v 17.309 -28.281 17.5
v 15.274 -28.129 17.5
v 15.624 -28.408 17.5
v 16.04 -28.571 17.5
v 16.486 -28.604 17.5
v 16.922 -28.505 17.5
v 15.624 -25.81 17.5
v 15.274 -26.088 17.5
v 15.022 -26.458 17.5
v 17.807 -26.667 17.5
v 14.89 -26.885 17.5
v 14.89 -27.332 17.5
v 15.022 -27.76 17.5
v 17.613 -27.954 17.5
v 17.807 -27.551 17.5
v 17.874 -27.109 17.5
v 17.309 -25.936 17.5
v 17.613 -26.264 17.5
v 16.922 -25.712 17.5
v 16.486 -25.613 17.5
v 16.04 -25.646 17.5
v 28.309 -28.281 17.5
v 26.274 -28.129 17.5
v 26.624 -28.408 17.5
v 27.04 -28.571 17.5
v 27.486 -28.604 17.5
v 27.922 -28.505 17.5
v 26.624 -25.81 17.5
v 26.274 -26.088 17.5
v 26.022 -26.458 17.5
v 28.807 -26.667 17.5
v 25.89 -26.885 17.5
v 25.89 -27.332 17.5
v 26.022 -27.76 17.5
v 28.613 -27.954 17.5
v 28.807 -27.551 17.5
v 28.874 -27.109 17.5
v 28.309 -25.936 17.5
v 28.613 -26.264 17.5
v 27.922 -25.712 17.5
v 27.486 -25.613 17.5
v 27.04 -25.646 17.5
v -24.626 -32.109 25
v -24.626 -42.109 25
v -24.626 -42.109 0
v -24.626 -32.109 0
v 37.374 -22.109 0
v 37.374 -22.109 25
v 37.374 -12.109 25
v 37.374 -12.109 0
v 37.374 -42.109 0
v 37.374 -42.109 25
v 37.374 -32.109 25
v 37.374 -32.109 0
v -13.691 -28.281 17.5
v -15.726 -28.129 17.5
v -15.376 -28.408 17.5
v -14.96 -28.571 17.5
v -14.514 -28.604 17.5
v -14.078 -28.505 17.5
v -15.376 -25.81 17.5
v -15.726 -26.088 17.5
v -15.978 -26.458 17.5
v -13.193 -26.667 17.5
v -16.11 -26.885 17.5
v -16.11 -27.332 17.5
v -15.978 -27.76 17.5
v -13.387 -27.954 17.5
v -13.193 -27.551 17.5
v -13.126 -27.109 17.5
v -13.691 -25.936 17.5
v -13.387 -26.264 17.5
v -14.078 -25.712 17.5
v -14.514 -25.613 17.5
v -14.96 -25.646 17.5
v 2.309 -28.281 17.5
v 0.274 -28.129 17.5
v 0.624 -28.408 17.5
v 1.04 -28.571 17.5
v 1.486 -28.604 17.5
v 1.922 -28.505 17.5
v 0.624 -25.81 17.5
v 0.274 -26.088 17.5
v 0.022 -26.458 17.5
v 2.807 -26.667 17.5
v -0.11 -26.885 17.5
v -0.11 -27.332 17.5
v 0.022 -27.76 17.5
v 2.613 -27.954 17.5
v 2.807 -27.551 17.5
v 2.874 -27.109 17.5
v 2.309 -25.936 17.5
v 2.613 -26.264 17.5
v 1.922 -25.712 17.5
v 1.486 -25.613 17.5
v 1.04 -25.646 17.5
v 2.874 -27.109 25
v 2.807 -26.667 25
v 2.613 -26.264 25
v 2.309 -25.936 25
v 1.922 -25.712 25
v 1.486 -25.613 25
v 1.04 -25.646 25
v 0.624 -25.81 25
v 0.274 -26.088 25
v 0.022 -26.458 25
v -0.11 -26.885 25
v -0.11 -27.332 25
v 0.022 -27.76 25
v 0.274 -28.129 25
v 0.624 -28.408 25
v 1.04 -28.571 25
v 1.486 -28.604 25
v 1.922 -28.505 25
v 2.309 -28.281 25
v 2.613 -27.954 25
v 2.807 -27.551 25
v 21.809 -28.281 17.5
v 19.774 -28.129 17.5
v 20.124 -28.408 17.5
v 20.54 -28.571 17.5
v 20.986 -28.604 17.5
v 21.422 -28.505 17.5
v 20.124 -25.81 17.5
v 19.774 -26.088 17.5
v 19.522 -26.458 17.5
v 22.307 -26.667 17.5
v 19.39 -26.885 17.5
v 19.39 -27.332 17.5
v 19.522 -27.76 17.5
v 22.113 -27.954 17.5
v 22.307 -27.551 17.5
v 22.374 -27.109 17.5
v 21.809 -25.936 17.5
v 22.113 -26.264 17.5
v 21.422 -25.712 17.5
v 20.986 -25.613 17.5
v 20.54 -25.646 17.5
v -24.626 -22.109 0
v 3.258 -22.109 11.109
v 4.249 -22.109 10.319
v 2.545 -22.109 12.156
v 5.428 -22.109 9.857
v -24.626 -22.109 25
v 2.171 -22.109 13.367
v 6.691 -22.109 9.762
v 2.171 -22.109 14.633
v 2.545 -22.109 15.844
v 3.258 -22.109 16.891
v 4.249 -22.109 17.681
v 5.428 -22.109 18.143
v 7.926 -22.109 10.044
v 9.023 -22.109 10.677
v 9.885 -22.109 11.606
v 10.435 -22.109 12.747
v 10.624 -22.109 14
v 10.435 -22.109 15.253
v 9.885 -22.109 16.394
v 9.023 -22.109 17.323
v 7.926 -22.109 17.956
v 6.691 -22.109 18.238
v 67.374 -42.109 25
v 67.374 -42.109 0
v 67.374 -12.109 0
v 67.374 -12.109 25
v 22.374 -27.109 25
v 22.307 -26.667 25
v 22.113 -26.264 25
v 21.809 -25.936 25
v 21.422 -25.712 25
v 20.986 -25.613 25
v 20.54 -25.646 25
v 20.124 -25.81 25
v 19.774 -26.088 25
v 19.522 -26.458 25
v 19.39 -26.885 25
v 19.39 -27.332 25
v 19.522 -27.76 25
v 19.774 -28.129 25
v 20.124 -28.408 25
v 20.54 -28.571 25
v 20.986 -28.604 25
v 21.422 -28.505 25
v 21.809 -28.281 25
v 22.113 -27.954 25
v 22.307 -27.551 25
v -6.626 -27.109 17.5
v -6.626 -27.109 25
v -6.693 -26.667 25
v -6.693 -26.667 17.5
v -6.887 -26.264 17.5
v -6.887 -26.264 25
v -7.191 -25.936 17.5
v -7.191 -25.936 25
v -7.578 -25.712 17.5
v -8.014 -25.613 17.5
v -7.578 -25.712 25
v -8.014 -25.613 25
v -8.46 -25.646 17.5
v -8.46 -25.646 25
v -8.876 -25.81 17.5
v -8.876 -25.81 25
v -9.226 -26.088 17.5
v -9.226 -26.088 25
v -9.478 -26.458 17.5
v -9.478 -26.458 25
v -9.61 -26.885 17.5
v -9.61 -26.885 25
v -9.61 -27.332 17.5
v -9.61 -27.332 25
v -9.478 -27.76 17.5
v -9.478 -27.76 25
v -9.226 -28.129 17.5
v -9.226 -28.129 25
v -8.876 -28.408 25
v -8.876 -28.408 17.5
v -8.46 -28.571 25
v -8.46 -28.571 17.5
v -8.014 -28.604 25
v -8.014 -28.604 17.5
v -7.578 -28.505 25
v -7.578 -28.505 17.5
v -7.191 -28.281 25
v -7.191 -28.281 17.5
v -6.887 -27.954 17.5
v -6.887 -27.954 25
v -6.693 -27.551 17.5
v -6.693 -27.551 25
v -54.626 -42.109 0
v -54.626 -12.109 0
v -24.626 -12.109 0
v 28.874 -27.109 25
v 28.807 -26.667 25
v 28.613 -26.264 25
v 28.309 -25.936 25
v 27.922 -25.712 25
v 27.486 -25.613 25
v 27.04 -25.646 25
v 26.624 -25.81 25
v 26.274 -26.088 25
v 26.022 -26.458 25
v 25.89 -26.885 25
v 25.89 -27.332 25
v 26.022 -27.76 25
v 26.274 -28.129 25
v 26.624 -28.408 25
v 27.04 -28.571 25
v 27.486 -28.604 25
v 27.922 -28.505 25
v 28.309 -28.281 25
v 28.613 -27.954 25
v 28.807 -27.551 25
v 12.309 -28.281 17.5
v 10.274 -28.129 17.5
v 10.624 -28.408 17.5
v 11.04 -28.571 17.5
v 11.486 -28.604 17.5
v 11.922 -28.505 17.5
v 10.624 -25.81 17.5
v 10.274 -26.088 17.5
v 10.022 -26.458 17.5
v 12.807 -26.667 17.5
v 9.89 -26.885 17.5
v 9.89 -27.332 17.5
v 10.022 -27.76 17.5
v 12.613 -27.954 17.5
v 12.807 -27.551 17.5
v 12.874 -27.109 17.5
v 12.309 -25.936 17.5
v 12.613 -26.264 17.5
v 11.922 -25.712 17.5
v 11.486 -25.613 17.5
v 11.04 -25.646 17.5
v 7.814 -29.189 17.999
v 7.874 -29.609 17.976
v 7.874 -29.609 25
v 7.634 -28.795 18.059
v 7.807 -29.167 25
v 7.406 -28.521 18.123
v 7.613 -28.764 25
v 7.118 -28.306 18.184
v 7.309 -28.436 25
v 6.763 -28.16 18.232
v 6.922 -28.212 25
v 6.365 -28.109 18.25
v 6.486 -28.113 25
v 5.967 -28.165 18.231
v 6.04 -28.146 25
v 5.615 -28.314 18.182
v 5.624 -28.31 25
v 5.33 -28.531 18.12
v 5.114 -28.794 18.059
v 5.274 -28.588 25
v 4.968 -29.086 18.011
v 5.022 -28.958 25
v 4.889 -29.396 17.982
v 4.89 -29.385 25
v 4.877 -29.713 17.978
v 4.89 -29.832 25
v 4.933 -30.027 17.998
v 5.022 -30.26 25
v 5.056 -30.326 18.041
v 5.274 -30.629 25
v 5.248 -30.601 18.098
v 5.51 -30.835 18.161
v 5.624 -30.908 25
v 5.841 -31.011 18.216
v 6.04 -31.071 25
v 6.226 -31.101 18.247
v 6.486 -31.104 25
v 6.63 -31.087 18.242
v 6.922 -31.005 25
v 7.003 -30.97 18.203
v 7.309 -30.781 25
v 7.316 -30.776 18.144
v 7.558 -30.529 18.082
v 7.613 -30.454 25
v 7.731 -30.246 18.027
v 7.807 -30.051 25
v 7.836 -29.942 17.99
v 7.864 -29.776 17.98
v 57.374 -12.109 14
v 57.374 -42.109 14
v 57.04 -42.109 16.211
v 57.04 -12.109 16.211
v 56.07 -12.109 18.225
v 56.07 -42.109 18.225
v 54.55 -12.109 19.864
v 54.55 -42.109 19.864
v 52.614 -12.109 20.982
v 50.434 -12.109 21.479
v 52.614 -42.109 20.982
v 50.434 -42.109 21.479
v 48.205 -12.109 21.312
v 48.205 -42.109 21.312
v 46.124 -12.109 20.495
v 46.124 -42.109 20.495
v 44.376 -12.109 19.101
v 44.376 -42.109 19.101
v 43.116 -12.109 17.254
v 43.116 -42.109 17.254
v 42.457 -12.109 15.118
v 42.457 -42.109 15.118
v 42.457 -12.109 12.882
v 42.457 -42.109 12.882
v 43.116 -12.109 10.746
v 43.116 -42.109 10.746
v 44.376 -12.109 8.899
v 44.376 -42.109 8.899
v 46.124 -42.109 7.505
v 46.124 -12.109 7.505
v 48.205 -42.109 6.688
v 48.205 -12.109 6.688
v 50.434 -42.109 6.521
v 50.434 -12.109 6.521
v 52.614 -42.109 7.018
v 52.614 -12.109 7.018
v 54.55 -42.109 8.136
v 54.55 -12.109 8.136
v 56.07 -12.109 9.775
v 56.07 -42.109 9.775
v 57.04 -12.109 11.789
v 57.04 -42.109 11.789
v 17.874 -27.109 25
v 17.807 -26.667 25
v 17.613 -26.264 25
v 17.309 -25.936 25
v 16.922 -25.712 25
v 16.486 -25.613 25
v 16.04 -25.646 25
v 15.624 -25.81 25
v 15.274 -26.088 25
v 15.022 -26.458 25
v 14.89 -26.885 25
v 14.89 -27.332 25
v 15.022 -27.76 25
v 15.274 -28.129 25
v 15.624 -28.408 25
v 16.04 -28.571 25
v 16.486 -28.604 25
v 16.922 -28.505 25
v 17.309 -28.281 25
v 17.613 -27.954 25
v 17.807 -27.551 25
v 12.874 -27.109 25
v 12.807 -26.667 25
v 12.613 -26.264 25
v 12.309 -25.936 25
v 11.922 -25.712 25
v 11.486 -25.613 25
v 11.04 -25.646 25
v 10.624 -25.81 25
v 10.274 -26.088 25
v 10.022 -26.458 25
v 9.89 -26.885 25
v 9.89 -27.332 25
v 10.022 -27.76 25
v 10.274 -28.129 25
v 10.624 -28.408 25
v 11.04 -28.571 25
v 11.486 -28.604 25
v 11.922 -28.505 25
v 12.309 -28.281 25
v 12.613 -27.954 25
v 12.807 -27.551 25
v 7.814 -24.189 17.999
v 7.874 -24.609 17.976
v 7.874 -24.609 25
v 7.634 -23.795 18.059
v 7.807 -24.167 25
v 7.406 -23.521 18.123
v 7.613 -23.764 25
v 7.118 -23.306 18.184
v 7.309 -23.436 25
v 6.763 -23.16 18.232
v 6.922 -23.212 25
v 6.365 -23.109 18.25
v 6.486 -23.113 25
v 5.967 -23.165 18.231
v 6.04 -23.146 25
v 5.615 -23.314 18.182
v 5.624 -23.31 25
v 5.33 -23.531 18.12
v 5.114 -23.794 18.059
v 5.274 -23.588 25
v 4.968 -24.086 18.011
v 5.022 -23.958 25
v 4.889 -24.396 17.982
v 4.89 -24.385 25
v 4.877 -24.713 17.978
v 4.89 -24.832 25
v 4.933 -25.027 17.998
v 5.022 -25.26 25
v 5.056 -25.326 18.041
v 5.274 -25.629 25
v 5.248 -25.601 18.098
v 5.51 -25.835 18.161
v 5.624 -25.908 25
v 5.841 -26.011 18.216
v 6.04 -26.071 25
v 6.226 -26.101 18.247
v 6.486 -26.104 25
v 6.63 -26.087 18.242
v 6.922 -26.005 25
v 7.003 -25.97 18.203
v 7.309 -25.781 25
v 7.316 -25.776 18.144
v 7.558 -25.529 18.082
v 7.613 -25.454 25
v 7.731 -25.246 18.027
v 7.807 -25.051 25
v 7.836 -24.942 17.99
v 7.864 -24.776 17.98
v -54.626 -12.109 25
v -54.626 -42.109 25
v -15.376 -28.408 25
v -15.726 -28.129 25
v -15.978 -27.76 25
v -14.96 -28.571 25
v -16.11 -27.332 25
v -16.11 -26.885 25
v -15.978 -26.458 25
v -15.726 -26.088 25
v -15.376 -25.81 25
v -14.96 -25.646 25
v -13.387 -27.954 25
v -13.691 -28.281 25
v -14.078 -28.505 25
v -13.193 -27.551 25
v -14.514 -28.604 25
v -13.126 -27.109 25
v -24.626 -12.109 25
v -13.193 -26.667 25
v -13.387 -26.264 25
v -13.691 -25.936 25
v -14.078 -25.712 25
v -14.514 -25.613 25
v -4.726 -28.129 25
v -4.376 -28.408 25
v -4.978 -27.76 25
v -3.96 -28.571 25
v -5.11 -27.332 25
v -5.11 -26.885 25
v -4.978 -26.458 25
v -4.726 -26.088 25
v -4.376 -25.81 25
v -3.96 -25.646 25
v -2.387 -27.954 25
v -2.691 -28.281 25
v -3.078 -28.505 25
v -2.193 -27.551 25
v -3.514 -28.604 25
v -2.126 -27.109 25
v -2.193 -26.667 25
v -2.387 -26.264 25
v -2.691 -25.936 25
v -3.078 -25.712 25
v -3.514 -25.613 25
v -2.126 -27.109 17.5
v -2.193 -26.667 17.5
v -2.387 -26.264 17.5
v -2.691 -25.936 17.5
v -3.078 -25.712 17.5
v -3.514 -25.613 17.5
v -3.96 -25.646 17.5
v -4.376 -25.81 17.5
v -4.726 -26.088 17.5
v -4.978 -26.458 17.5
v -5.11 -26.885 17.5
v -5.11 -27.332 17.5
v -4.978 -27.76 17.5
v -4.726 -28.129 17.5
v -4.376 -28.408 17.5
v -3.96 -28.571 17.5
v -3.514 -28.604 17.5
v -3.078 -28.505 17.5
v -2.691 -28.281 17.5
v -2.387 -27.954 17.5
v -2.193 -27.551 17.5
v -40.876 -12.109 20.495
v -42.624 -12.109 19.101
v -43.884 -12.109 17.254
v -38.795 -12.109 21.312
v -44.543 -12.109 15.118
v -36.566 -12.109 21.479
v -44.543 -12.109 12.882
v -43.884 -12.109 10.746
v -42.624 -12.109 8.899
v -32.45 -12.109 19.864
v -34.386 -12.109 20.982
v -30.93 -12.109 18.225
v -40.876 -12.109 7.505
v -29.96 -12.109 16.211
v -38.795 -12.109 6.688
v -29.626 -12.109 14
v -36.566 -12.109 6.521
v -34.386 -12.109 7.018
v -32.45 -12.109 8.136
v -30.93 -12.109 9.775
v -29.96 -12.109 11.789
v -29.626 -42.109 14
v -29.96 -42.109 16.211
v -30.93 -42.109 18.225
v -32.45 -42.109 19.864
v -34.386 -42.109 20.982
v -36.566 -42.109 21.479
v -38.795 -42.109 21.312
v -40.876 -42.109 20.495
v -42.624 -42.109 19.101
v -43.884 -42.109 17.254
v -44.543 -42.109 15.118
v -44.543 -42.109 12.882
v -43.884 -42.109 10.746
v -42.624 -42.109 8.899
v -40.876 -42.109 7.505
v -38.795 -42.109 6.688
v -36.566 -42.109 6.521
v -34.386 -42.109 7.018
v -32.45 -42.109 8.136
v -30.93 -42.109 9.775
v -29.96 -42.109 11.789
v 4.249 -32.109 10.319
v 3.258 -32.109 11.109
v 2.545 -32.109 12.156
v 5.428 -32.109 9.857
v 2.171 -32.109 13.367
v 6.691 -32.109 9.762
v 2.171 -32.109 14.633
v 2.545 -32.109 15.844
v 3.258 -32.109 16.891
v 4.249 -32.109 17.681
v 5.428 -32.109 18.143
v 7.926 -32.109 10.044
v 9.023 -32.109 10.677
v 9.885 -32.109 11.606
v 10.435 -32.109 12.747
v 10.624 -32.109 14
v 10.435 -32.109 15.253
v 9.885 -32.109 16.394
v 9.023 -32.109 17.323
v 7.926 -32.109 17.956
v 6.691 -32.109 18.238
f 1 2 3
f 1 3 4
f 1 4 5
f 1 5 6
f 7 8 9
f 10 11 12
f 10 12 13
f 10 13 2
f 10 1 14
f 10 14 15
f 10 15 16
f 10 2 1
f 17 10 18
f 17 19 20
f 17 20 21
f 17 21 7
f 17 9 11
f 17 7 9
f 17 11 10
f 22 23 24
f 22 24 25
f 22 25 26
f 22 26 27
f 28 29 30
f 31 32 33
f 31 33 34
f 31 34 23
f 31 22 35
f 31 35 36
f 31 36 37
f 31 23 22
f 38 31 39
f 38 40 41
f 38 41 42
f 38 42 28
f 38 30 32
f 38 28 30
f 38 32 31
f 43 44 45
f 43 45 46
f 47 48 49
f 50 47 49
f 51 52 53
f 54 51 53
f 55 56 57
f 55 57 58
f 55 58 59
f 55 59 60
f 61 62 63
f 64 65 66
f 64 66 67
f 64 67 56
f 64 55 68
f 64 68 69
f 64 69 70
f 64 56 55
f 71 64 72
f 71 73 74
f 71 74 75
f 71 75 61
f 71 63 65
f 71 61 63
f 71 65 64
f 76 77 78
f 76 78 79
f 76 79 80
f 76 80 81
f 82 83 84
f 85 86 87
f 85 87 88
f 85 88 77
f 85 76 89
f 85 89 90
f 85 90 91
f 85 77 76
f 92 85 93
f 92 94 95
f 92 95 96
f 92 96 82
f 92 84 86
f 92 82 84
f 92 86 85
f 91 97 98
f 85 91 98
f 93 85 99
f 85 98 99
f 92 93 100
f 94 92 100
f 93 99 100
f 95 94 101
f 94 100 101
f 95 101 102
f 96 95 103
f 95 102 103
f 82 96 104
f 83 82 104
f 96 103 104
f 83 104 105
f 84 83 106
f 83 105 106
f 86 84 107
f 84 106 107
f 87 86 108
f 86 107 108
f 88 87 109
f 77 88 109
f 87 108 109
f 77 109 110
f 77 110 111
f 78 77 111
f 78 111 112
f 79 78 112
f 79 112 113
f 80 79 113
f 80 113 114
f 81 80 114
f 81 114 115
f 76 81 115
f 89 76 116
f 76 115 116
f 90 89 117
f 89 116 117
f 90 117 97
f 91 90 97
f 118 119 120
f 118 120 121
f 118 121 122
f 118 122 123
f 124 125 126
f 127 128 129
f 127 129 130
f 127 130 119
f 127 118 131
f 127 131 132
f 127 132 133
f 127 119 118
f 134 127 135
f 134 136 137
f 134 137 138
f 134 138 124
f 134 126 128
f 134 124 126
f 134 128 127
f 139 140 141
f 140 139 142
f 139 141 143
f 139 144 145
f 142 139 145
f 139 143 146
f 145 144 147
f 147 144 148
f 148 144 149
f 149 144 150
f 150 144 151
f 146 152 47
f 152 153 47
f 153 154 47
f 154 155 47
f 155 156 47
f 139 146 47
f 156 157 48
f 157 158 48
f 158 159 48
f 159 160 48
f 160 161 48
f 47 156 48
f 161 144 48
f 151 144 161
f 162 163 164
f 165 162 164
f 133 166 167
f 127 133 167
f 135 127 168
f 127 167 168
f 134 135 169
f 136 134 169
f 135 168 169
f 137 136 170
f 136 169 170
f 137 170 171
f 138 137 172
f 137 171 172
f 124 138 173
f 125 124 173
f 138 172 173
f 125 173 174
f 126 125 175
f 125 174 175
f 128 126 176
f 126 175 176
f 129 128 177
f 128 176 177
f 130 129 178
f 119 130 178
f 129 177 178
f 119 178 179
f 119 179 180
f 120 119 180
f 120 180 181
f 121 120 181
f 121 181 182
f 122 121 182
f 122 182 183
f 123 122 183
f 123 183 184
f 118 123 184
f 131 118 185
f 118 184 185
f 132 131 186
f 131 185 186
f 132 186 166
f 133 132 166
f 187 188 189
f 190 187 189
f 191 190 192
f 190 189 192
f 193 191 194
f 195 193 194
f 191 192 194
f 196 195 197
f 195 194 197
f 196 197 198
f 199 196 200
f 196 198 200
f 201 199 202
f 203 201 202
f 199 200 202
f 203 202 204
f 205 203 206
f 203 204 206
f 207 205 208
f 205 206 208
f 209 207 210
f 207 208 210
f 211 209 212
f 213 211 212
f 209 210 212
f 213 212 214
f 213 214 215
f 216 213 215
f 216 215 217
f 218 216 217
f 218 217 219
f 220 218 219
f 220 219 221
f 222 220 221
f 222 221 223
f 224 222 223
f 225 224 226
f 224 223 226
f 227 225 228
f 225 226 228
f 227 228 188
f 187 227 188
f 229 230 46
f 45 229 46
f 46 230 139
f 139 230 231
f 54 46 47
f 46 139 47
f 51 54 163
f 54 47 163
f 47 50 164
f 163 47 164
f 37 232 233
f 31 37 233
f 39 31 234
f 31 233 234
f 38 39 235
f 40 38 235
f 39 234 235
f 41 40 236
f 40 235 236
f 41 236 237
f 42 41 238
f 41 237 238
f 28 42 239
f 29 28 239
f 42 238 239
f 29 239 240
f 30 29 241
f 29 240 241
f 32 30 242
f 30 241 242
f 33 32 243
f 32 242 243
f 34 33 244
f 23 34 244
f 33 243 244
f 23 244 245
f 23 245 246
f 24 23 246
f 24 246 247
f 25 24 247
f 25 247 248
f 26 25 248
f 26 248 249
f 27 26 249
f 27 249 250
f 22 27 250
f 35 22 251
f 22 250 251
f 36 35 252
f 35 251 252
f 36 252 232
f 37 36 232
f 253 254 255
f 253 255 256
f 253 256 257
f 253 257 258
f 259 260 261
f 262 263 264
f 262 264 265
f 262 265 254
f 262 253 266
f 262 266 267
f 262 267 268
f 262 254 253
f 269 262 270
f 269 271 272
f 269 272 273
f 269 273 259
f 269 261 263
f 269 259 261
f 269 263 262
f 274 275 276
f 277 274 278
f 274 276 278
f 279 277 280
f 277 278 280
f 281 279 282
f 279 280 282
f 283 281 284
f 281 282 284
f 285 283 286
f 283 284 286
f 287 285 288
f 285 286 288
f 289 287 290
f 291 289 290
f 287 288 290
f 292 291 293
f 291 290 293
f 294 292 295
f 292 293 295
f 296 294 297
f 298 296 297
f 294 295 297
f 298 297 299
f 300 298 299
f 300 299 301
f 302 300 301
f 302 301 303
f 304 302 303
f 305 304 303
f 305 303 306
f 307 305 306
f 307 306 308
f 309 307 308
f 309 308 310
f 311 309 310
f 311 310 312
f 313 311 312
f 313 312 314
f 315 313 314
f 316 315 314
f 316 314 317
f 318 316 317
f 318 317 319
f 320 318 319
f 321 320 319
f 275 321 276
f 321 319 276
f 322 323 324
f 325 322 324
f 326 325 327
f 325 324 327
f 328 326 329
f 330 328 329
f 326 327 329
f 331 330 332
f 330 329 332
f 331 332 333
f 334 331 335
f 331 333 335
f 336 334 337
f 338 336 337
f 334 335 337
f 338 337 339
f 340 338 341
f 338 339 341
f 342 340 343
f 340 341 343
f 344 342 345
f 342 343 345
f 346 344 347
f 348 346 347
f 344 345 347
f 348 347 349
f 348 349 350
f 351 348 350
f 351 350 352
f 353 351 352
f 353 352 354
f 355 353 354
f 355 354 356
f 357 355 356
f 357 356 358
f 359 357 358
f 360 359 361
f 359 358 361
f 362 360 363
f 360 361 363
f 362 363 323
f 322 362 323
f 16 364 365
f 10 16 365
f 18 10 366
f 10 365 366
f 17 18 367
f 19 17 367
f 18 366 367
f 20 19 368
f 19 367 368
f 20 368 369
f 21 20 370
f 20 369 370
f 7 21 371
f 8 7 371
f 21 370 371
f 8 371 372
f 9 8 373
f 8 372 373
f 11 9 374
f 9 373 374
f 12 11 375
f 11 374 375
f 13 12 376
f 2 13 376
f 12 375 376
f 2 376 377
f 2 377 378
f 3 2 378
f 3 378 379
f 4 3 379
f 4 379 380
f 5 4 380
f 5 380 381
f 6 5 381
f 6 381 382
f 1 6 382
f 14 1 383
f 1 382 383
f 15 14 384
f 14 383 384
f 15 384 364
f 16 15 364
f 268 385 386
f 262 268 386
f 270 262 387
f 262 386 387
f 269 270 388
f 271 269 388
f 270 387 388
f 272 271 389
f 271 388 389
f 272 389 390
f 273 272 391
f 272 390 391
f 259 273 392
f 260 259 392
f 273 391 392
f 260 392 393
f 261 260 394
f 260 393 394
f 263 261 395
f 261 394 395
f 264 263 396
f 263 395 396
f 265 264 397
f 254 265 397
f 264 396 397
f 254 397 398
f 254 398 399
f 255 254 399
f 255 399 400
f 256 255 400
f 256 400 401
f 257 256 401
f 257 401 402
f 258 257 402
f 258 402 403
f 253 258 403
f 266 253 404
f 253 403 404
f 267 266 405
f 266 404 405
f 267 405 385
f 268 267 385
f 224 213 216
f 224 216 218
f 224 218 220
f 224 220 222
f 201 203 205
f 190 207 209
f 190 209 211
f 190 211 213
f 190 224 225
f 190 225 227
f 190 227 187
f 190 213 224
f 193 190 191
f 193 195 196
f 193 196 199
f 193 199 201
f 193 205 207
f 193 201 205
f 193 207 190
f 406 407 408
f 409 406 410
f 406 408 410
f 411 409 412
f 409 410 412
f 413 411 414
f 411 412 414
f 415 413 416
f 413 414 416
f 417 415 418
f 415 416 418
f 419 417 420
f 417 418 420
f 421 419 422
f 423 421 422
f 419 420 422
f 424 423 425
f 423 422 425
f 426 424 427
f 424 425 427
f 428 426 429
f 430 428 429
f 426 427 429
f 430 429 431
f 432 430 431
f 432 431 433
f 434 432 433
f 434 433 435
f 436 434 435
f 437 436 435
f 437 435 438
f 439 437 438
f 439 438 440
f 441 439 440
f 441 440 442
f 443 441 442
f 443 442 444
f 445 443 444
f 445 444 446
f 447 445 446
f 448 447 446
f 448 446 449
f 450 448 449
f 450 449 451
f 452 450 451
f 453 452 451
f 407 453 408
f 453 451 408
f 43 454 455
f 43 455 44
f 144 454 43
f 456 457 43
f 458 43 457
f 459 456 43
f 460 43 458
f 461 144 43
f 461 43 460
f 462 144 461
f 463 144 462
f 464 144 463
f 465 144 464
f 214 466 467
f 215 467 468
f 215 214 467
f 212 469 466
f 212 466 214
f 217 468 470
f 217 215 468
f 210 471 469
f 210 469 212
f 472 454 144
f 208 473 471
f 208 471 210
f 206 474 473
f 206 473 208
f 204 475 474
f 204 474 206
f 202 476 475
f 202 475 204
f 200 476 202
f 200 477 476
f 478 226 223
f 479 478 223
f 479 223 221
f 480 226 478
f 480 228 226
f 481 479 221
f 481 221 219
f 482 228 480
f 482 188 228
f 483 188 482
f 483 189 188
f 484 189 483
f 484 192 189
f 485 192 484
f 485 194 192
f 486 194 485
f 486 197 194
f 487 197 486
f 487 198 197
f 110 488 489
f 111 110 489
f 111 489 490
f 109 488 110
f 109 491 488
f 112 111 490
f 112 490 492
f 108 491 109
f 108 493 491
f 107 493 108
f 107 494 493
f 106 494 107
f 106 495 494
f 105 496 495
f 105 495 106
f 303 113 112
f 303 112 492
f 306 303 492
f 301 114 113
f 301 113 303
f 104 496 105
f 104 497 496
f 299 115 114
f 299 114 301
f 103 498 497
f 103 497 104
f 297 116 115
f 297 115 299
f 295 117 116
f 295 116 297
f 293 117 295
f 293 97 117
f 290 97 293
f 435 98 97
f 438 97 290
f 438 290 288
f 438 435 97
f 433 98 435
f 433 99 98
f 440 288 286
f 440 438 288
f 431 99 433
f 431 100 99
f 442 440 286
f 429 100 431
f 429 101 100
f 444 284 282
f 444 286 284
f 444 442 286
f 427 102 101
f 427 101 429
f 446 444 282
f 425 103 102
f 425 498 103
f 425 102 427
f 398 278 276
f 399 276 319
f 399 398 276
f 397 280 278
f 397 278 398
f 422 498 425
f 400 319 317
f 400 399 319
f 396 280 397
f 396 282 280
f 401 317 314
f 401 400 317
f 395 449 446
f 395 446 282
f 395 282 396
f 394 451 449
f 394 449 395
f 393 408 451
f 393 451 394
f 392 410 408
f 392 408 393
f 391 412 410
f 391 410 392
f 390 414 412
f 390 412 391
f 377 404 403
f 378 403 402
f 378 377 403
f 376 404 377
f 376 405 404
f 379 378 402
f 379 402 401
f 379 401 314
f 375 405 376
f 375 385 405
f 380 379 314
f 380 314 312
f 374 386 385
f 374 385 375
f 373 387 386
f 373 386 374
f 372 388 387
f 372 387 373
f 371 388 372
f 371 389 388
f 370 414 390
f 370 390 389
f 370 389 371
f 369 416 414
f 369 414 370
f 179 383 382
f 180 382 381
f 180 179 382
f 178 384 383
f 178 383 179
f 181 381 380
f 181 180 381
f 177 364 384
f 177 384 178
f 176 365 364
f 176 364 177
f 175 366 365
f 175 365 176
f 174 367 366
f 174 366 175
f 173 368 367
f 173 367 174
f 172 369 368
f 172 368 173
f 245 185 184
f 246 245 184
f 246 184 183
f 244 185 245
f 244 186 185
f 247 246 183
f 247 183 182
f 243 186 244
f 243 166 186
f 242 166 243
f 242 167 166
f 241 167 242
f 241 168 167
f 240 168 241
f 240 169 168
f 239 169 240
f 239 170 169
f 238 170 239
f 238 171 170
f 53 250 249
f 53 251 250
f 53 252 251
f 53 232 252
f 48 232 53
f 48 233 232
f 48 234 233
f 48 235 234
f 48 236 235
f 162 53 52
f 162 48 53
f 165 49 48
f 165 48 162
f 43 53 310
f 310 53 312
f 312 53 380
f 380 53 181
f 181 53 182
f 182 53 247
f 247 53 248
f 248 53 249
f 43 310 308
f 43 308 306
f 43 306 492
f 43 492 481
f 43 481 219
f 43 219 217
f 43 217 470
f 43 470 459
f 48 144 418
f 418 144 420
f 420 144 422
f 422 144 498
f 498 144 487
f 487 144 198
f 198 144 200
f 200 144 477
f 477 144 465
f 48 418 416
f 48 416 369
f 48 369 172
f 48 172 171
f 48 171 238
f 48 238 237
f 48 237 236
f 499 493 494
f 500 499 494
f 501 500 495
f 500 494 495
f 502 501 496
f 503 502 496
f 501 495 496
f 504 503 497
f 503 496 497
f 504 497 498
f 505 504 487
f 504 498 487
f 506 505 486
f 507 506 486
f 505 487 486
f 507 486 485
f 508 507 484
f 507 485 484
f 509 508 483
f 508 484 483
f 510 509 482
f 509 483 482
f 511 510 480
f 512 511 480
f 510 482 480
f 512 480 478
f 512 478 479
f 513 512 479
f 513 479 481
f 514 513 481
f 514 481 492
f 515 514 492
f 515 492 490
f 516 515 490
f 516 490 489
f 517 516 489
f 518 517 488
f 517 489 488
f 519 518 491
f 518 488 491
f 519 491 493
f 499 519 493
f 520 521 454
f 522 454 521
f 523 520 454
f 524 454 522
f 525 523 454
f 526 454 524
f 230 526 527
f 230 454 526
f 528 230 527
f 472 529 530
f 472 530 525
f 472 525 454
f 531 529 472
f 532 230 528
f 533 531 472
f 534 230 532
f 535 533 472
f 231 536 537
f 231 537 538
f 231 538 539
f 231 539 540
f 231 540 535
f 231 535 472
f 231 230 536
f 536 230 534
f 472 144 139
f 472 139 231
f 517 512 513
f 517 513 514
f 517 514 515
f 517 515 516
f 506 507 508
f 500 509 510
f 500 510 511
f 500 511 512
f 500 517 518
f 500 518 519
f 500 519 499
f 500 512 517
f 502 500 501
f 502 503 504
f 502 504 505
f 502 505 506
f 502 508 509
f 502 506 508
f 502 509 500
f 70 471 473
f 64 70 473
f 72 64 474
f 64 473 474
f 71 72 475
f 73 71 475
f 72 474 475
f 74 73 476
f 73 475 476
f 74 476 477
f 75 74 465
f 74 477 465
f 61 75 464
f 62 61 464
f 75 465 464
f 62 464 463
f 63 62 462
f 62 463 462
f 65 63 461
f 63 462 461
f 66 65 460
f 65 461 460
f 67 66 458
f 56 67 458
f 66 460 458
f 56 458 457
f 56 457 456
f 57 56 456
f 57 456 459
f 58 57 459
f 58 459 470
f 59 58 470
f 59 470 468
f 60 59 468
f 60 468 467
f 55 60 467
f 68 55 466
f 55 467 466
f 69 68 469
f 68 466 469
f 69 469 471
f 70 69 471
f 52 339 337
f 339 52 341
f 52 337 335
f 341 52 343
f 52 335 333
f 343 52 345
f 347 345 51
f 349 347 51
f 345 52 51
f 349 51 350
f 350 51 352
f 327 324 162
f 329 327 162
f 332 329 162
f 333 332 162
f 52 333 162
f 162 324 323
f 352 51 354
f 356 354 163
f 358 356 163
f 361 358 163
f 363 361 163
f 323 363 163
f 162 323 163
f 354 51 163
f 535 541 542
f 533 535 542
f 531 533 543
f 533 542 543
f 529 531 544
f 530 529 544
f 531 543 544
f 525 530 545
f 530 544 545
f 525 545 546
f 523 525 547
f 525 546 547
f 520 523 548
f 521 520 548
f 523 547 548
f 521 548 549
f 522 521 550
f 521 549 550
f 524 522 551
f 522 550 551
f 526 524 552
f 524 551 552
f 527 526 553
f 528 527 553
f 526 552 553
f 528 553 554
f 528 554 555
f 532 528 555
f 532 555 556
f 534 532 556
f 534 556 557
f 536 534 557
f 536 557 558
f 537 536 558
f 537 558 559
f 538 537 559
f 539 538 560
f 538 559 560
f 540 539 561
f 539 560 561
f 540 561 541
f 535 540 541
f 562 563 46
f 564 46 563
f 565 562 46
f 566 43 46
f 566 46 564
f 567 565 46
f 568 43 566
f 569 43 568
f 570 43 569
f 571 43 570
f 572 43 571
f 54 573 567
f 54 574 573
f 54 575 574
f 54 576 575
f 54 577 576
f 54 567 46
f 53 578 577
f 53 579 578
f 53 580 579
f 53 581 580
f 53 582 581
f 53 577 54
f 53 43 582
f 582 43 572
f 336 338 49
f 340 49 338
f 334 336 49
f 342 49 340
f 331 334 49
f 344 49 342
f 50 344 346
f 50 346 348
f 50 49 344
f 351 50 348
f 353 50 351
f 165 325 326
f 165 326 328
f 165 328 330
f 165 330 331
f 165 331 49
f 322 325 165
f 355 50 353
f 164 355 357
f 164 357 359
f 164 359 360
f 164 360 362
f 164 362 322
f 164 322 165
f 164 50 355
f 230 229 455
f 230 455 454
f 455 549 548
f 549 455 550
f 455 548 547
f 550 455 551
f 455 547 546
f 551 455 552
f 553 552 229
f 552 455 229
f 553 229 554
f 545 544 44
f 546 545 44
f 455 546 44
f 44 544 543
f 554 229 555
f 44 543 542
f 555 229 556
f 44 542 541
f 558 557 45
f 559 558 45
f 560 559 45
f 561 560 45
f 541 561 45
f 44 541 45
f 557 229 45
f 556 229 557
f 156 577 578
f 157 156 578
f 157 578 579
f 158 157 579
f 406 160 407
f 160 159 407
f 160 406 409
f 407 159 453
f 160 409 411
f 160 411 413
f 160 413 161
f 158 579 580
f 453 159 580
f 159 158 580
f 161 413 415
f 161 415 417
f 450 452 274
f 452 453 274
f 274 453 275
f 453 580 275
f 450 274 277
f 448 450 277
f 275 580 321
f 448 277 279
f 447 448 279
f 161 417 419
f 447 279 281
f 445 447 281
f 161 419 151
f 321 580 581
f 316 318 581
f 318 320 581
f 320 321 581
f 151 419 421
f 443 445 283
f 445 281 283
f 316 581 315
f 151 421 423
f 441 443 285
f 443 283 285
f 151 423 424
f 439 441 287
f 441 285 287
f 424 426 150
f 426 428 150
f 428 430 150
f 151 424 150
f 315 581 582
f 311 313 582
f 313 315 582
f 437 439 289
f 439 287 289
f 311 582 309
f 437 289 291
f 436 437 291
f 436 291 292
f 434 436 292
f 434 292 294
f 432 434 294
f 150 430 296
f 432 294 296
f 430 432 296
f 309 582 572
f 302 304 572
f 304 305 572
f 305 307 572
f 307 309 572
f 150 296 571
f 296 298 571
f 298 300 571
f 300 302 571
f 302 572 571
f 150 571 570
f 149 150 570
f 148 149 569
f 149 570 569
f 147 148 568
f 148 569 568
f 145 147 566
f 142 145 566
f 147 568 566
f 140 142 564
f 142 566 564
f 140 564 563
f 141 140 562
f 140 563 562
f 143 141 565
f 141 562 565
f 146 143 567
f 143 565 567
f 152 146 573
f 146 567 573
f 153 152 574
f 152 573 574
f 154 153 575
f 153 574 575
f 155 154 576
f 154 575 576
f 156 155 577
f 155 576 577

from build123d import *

# Parameters (mm, degrees)
F0_W     = 122
F0_H     = 30
F1_DEPTH = 25
F2_R     = 7.5
F2_R_2   = 4.25
F3_DEPTH = 30
F4_W     = 62
F4_H     = 10
F5_DEPTH = 30
F6_R     = 1.5
F7_DEPTH = 7.5


with BuildPart() as f1:
    # F0 (on Top) → F1 (new body)
    with BuildSketch(Plane.XY):
        with Locations((6.373649, -27.108692)):
            Rectangle(F0_W, F0_H)
    extrude(amount=F1_DEPTH)

    # F2 (on face) → F3 (cut, through all)
    with BuildSketch(Plane.XZ.offset(42.108692)):
        with Locations((-37.126351, 14)):
            Circle(F2_R)
        with Locations((49.873649, 14)):
            Circle(F2_R)
        with Locations((6.373649, 14)):
            Circle(F2_R_2)
    extrude(amount=-F3_DEPTH, mode=Mode.SUBTRACT)

    # F4 (on face) → F5 (cut)
    with BuildSketch(Plane.XY.offset(25)):
        with Locations((6.373649, -17.108692)):
            Rectangle(F4_W, F4_H)
        with Locations((6.373649, -37.108692)):
            Rectangle(F4_W, F4_H)
    extrude(amount=-F5_DEPTH, mode=Mode.SUBTRACT)

    # F6 (on face) → F7 (cut)
    with BuildSketch(Plane.XY.offset(25)):
        with Locations((6.373649, -29.608692)):
            Circle(F6_R)
        with Locations((6.373649, -24.608692)):
            Circle(F6_R)
        with Locations((11.373649, -27.108692)):
            Circle(F6_R)
        with Locations((16.373649, -27.108692)):
            Circle(F6_R)
        with Locations((20.873649, -27.108692)):
            Circle(F6_R)
        with Locations((27.373649, -27.108692)):
            Circle(F6_R)
        with Locations((1.373649, -27.108692)):
            Circle(F6_R)
        with Locations((-3.626351, -27.108692)):
            Circle(F6_R)
        with Locations((-8.126351, -27.108692)):
            Circle(F6_R)
        with Locations((-14.626351, -27.108692)):
            Circle(F6_R)
    extrude(amount=-F7_DEPTH, mode=Mode.SUBTRACT)


solid = f1.part
